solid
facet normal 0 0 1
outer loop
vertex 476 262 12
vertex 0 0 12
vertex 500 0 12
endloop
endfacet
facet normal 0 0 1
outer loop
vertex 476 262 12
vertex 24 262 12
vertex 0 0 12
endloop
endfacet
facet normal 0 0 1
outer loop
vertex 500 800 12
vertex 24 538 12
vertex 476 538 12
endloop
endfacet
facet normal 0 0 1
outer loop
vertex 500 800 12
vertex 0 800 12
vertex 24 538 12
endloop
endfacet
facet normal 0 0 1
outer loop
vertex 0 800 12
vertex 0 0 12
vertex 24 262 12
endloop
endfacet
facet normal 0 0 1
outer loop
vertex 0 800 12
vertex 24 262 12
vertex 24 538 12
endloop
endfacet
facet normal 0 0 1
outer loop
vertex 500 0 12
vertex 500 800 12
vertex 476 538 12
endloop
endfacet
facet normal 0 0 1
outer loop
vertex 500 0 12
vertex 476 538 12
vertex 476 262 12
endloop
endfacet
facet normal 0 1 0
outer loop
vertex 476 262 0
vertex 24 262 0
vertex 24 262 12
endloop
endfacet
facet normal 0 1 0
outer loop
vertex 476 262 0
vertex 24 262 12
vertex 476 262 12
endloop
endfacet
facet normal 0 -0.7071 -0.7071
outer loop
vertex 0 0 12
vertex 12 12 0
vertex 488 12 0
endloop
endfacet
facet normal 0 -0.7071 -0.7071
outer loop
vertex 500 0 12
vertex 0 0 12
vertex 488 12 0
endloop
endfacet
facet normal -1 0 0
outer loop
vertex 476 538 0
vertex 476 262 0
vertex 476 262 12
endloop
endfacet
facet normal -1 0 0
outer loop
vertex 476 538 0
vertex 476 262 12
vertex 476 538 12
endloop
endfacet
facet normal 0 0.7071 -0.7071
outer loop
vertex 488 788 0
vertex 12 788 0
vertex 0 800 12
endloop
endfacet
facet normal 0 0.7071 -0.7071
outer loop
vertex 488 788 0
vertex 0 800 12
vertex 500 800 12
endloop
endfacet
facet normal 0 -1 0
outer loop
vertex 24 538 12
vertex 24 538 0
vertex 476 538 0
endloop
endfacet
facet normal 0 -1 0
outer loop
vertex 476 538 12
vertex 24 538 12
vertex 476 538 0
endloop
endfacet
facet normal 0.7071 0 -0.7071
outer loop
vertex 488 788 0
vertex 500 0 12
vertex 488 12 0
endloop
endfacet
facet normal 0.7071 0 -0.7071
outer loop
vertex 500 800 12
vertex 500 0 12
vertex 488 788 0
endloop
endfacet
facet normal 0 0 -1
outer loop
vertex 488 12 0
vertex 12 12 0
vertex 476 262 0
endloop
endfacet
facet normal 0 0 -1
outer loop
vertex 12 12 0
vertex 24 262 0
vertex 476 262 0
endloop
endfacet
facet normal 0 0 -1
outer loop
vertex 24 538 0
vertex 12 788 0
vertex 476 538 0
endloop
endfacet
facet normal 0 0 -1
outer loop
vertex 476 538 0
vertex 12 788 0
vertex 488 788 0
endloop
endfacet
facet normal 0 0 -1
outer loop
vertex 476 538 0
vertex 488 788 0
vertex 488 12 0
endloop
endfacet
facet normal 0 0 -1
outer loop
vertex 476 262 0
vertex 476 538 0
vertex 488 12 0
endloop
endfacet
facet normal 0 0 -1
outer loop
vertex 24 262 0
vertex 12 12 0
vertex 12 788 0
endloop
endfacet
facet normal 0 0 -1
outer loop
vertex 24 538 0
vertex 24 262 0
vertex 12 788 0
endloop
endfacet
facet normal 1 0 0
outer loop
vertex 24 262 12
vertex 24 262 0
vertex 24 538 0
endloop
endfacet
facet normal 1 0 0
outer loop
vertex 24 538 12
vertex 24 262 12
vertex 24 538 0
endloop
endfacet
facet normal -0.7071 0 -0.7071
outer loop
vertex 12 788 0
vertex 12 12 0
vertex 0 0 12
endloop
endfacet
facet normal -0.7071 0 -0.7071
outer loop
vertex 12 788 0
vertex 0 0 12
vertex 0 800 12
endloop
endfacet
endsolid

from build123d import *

# Parameters (mm, degrees)
SKETCH1_W           = 500
SKETCH1_H           = 800
BOSS_EXTRUDE1_DEPTH = 12
SKETCH1_5_W         = 452
SKETCH1_5_H         = 276
CUT_EXTRUDE1_DEPTH  = 944.474429966
CHAMFER1_SIZE       = 12


with BuildPart() as part:
    # Sketch1 → Boss-Extrude1 (new body)
    with BuildSketch(Plane.XY):
        with Locations((250, 400)):
            Rectangle(SKETCH1_W, SKETCH1_H)
    extrude(amount=BOSS_EXTRUDE1_DEPTH)

    # Sketch1<5> → Cut-Extrude1 (cut, through all)
    with BuildSketch(Plane.XY):
        with Locations((250, 400)):
            Rectangle(SKETCH1_5_W, SKETCH1_5_H)
    extrude(amount=CUT_EXTRUDE1_DEPTH, mode=Mode.SUBTRACT)

    # Chamfer1
    chamfer1_edges = [part.edges().sort_by_distance(p)[0] for p in [
        (250, 0, 0),
        (0, 400, 0),
        (250, 800, 0),
        (500, 400, 0),
    ]]
    chamfer(chamfer1_edges, length=CHAMFER1_SIZE - 0.0001)  # a hair under: the kernel refuses the full size


solid = part.part
